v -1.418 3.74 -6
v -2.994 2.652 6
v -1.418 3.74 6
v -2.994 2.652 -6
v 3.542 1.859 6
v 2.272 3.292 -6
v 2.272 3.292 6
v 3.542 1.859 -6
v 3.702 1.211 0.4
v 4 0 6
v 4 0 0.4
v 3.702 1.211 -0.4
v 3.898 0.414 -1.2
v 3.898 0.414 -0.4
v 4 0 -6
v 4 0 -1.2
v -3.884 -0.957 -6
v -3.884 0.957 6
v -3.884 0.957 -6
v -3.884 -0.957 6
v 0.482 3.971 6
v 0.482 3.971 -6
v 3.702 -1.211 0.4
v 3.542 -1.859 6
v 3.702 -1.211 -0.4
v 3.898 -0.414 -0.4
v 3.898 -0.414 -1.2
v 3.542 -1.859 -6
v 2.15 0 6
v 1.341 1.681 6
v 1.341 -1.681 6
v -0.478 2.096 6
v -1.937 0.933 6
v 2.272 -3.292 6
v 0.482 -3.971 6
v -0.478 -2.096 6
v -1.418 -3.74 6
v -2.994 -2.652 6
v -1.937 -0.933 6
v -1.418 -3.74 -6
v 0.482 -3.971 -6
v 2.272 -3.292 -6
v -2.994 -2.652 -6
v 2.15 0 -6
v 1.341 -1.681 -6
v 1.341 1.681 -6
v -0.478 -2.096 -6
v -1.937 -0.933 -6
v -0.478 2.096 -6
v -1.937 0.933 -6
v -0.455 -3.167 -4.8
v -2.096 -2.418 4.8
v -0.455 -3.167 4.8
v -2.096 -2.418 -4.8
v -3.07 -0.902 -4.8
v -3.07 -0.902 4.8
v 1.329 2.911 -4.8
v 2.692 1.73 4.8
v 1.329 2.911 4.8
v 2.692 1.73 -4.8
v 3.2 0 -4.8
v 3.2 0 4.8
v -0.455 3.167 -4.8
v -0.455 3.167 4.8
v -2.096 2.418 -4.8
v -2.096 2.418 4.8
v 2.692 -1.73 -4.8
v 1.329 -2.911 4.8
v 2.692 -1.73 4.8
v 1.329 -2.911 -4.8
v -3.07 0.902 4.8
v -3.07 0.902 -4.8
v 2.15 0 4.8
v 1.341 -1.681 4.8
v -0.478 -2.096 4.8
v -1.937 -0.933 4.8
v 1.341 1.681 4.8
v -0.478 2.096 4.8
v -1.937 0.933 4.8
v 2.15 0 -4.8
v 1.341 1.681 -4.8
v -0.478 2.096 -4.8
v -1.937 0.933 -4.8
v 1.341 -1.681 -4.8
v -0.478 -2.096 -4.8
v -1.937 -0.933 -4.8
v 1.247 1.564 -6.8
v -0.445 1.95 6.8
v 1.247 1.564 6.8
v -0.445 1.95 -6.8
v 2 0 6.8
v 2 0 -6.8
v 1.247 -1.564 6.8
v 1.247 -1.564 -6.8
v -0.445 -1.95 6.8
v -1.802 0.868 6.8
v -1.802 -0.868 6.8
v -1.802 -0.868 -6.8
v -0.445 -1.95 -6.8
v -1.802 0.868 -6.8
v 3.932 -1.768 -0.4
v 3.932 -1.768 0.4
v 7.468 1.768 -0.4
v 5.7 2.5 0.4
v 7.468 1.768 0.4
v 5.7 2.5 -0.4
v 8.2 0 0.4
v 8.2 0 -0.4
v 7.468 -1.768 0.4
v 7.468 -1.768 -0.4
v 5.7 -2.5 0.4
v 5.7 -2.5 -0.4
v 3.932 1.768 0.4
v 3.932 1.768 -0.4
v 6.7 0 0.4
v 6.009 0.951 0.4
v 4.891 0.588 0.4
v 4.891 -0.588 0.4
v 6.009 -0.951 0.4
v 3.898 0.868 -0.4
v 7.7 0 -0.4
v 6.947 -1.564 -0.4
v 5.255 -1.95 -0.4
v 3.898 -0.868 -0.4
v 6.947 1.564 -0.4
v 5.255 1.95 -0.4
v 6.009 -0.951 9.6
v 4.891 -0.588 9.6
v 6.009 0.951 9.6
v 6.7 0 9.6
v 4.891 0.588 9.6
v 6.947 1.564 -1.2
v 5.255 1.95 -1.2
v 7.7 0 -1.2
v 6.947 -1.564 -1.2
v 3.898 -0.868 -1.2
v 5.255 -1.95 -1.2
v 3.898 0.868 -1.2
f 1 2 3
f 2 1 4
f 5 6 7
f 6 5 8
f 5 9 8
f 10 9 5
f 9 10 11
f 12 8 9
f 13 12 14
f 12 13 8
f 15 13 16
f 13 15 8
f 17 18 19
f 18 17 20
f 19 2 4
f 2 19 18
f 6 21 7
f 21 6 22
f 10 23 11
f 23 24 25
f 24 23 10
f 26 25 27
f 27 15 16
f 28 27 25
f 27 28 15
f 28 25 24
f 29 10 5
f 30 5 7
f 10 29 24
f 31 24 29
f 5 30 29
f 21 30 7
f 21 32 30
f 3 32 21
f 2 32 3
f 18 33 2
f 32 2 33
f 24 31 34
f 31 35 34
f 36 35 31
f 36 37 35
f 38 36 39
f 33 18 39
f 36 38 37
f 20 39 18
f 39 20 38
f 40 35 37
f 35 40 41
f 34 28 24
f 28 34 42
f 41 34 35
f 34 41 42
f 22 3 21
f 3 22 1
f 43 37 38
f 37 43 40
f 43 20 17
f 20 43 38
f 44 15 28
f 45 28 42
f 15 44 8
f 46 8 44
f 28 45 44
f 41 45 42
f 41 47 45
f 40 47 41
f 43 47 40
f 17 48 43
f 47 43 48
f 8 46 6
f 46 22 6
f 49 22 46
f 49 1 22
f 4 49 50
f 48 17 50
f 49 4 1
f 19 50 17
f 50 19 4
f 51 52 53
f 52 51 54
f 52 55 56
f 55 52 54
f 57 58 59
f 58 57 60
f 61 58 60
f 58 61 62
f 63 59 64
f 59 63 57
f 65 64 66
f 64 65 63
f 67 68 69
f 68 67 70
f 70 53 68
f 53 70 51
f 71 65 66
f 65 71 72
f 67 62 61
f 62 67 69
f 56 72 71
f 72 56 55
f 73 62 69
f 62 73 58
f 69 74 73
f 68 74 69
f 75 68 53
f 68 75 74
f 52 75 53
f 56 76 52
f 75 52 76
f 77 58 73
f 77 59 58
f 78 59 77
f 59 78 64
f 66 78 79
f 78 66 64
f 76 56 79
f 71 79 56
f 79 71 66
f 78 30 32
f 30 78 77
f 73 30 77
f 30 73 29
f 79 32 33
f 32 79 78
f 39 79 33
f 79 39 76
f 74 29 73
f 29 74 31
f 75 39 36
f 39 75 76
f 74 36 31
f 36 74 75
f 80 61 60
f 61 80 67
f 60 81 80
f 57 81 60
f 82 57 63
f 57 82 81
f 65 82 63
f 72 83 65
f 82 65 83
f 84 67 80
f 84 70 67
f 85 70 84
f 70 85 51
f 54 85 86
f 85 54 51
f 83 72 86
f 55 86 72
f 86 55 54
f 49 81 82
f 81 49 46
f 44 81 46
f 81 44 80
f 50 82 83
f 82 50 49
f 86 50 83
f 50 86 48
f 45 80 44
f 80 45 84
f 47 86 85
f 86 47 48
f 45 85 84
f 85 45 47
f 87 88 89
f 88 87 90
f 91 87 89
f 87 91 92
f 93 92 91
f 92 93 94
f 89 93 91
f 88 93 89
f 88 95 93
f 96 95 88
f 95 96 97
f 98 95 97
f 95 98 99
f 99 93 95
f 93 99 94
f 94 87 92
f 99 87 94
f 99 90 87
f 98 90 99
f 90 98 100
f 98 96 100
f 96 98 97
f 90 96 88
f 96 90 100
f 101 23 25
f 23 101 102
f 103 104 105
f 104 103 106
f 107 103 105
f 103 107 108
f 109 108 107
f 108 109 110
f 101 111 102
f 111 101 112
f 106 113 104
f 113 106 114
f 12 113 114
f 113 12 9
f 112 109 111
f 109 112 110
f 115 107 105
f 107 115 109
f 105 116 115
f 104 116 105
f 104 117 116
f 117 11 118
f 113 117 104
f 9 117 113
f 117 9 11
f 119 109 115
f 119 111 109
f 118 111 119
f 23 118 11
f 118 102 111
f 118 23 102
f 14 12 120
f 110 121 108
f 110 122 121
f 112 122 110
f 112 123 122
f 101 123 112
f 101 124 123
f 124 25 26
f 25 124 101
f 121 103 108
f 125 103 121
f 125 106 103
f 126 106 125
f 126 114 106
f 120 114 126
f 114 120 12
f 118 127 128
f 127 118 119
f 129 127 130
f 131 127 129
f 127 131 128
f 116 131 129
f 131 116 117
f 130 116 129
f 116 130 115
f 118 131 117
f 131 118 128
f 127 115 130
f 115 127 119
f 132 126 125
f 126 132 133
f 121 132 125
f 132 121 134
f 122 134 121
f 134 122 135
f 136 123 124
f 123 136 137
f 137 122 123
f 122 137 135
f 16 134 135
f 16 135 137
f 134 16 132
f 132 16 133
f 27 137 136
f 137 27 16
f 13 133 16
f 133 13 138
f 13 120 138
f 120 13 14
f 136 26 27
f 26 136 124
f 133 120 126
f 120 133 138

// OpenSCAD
// Parameters
bore_diameter_mm = 4.0; //[2.0:8.0:0.1]
outer_diameter_mm = 8.0; //[4.0:16.0:0.1]
length_mm = 12.0; //[6.0:24.0:0.1]
casing_wall_thickness_mm = 0.8; //[0.4:1.6:0.05]
seal_lip_radial_thickness_mm = 0.4; //[0.2:1.0:0.05]
seal_lip_axial_length_mm = 1.2; //[0.6:3.0:0.1]
seal_lip_clearance_mm = 0.15; //[0.05:0.4:0.01]
connect_overlap_mm = 0.8; //[0.5:2.0:0.1]
screw_shank_diameter_mm = 2.0; //[1.0:4.0:0.1]
screw_length_mm = 10.0; //[5.0:20.0:0.5]
screw_head_diameter_mm = 4.0; //[2.5:8.0:0.1]
screw_head_height_mm = 1.6; //[0.8:3.5:0.1]
washer_outer_diameter_mm = 5.0; //[3.0:10.0:0.1]
washer_thickness_mm = 0.8; //[0.4:2.0:0.05]

// Linear Bearing - complete geometry
module linear_bearing() {
  color("DimGray") {
    // Outer casing
    difference() {
      cylinder(r=outer_diameter_mm/2, h=length_mm, center=true);
      cylinder(r=outer_diameter_mm/2 - casing_wall_thickness_mm, h=length_mm + 2*connect_overlap_mm, center=true);
    }
    // End seal lips
    union() {
      difference() {
        translate([0, 0, length_mm/2 - seal_lip_axial_length_mm/2])
          cylinder(r=outer_diameter_mm/2 - casing_wall_thickness_mm, h=seal_lip_axial_length_mm, center=true);
        translate([0, 0, length_mm/2 - seal_lip_axial_length_mm/2])
          cylinder(r=bore_diameter_mm/2 + seal_lip_clearance_mm, h=seal_lip_axial_length_mm + 2*connect_overlap_mm, center=true);
      }
      difference() {
        translate([0, 0, -length_mm/2 + seal_lip_axial_length_mm/2])
          cylinder(r=outer_diameter_mm/2 - casing_wall_thickness_mm, h=seal_lip_axial_length_mm, center=true);
        translate([0, 0, -length_mm/2 + seal_lip_axial_length_mm/2])
          cylinder(r=bore_diameter_mm/2 + seal_lip_clearance_mm, h=seal_lip_axial_length_mm + 2*connect_overlap_mm, center=true);
      }
    }
    // Through bore
    translate([0, 0, 0])
      cylinder(r=bore_diameter_mm/2, h=length_mm + 2*connect_overlap_mm, center=true);
  }
}

// Screw and Washer - complete geometry
module screw_and_washer() {
  color("Silver") {
    // Washer
    translate([outer_diameter_mm/2 + washer_outer_diameter_mm/2 - connect_overlap_mm, 0, 0])
      difference() {
        cylinder(r=washer_outer_diameter_mm/2, h=washer_thickness_mm, center=true);
        cylinder(r=screw_shank_diameter_mm/2 + seal_lip_clearance_mm, h=washer_thickness_mm + 2*connect_overlap_mm, center=true);
      }
    // Screw shank
    translate([outer_diameter_mm/2 + washer_outer_diameter_mm/2 - connect_overlap_mm, 0, washer_thickness_mm/2 + screw_length_mm/2 - connect_overlap_mm])
      cylinder(r=screw_shank_diameter_mm/2, h=screw_length_mm, center=true);
    // Screw head
    translate([outer_diameter_mm/2 + washer_outer_diameter_mm/2 - connect_overlap_mm, 0, -washer_thickness_mm/2 - screw_head_height_mm/2 + connect_overlap_mm])
      cylinder(r=screw_head_diameter_mm/2, h=screw_head_height_mm, center=true);
  }
}

// Assembly
module assembly() {
  linear_bearing();
  screw_and_washer();
}

assembly();
